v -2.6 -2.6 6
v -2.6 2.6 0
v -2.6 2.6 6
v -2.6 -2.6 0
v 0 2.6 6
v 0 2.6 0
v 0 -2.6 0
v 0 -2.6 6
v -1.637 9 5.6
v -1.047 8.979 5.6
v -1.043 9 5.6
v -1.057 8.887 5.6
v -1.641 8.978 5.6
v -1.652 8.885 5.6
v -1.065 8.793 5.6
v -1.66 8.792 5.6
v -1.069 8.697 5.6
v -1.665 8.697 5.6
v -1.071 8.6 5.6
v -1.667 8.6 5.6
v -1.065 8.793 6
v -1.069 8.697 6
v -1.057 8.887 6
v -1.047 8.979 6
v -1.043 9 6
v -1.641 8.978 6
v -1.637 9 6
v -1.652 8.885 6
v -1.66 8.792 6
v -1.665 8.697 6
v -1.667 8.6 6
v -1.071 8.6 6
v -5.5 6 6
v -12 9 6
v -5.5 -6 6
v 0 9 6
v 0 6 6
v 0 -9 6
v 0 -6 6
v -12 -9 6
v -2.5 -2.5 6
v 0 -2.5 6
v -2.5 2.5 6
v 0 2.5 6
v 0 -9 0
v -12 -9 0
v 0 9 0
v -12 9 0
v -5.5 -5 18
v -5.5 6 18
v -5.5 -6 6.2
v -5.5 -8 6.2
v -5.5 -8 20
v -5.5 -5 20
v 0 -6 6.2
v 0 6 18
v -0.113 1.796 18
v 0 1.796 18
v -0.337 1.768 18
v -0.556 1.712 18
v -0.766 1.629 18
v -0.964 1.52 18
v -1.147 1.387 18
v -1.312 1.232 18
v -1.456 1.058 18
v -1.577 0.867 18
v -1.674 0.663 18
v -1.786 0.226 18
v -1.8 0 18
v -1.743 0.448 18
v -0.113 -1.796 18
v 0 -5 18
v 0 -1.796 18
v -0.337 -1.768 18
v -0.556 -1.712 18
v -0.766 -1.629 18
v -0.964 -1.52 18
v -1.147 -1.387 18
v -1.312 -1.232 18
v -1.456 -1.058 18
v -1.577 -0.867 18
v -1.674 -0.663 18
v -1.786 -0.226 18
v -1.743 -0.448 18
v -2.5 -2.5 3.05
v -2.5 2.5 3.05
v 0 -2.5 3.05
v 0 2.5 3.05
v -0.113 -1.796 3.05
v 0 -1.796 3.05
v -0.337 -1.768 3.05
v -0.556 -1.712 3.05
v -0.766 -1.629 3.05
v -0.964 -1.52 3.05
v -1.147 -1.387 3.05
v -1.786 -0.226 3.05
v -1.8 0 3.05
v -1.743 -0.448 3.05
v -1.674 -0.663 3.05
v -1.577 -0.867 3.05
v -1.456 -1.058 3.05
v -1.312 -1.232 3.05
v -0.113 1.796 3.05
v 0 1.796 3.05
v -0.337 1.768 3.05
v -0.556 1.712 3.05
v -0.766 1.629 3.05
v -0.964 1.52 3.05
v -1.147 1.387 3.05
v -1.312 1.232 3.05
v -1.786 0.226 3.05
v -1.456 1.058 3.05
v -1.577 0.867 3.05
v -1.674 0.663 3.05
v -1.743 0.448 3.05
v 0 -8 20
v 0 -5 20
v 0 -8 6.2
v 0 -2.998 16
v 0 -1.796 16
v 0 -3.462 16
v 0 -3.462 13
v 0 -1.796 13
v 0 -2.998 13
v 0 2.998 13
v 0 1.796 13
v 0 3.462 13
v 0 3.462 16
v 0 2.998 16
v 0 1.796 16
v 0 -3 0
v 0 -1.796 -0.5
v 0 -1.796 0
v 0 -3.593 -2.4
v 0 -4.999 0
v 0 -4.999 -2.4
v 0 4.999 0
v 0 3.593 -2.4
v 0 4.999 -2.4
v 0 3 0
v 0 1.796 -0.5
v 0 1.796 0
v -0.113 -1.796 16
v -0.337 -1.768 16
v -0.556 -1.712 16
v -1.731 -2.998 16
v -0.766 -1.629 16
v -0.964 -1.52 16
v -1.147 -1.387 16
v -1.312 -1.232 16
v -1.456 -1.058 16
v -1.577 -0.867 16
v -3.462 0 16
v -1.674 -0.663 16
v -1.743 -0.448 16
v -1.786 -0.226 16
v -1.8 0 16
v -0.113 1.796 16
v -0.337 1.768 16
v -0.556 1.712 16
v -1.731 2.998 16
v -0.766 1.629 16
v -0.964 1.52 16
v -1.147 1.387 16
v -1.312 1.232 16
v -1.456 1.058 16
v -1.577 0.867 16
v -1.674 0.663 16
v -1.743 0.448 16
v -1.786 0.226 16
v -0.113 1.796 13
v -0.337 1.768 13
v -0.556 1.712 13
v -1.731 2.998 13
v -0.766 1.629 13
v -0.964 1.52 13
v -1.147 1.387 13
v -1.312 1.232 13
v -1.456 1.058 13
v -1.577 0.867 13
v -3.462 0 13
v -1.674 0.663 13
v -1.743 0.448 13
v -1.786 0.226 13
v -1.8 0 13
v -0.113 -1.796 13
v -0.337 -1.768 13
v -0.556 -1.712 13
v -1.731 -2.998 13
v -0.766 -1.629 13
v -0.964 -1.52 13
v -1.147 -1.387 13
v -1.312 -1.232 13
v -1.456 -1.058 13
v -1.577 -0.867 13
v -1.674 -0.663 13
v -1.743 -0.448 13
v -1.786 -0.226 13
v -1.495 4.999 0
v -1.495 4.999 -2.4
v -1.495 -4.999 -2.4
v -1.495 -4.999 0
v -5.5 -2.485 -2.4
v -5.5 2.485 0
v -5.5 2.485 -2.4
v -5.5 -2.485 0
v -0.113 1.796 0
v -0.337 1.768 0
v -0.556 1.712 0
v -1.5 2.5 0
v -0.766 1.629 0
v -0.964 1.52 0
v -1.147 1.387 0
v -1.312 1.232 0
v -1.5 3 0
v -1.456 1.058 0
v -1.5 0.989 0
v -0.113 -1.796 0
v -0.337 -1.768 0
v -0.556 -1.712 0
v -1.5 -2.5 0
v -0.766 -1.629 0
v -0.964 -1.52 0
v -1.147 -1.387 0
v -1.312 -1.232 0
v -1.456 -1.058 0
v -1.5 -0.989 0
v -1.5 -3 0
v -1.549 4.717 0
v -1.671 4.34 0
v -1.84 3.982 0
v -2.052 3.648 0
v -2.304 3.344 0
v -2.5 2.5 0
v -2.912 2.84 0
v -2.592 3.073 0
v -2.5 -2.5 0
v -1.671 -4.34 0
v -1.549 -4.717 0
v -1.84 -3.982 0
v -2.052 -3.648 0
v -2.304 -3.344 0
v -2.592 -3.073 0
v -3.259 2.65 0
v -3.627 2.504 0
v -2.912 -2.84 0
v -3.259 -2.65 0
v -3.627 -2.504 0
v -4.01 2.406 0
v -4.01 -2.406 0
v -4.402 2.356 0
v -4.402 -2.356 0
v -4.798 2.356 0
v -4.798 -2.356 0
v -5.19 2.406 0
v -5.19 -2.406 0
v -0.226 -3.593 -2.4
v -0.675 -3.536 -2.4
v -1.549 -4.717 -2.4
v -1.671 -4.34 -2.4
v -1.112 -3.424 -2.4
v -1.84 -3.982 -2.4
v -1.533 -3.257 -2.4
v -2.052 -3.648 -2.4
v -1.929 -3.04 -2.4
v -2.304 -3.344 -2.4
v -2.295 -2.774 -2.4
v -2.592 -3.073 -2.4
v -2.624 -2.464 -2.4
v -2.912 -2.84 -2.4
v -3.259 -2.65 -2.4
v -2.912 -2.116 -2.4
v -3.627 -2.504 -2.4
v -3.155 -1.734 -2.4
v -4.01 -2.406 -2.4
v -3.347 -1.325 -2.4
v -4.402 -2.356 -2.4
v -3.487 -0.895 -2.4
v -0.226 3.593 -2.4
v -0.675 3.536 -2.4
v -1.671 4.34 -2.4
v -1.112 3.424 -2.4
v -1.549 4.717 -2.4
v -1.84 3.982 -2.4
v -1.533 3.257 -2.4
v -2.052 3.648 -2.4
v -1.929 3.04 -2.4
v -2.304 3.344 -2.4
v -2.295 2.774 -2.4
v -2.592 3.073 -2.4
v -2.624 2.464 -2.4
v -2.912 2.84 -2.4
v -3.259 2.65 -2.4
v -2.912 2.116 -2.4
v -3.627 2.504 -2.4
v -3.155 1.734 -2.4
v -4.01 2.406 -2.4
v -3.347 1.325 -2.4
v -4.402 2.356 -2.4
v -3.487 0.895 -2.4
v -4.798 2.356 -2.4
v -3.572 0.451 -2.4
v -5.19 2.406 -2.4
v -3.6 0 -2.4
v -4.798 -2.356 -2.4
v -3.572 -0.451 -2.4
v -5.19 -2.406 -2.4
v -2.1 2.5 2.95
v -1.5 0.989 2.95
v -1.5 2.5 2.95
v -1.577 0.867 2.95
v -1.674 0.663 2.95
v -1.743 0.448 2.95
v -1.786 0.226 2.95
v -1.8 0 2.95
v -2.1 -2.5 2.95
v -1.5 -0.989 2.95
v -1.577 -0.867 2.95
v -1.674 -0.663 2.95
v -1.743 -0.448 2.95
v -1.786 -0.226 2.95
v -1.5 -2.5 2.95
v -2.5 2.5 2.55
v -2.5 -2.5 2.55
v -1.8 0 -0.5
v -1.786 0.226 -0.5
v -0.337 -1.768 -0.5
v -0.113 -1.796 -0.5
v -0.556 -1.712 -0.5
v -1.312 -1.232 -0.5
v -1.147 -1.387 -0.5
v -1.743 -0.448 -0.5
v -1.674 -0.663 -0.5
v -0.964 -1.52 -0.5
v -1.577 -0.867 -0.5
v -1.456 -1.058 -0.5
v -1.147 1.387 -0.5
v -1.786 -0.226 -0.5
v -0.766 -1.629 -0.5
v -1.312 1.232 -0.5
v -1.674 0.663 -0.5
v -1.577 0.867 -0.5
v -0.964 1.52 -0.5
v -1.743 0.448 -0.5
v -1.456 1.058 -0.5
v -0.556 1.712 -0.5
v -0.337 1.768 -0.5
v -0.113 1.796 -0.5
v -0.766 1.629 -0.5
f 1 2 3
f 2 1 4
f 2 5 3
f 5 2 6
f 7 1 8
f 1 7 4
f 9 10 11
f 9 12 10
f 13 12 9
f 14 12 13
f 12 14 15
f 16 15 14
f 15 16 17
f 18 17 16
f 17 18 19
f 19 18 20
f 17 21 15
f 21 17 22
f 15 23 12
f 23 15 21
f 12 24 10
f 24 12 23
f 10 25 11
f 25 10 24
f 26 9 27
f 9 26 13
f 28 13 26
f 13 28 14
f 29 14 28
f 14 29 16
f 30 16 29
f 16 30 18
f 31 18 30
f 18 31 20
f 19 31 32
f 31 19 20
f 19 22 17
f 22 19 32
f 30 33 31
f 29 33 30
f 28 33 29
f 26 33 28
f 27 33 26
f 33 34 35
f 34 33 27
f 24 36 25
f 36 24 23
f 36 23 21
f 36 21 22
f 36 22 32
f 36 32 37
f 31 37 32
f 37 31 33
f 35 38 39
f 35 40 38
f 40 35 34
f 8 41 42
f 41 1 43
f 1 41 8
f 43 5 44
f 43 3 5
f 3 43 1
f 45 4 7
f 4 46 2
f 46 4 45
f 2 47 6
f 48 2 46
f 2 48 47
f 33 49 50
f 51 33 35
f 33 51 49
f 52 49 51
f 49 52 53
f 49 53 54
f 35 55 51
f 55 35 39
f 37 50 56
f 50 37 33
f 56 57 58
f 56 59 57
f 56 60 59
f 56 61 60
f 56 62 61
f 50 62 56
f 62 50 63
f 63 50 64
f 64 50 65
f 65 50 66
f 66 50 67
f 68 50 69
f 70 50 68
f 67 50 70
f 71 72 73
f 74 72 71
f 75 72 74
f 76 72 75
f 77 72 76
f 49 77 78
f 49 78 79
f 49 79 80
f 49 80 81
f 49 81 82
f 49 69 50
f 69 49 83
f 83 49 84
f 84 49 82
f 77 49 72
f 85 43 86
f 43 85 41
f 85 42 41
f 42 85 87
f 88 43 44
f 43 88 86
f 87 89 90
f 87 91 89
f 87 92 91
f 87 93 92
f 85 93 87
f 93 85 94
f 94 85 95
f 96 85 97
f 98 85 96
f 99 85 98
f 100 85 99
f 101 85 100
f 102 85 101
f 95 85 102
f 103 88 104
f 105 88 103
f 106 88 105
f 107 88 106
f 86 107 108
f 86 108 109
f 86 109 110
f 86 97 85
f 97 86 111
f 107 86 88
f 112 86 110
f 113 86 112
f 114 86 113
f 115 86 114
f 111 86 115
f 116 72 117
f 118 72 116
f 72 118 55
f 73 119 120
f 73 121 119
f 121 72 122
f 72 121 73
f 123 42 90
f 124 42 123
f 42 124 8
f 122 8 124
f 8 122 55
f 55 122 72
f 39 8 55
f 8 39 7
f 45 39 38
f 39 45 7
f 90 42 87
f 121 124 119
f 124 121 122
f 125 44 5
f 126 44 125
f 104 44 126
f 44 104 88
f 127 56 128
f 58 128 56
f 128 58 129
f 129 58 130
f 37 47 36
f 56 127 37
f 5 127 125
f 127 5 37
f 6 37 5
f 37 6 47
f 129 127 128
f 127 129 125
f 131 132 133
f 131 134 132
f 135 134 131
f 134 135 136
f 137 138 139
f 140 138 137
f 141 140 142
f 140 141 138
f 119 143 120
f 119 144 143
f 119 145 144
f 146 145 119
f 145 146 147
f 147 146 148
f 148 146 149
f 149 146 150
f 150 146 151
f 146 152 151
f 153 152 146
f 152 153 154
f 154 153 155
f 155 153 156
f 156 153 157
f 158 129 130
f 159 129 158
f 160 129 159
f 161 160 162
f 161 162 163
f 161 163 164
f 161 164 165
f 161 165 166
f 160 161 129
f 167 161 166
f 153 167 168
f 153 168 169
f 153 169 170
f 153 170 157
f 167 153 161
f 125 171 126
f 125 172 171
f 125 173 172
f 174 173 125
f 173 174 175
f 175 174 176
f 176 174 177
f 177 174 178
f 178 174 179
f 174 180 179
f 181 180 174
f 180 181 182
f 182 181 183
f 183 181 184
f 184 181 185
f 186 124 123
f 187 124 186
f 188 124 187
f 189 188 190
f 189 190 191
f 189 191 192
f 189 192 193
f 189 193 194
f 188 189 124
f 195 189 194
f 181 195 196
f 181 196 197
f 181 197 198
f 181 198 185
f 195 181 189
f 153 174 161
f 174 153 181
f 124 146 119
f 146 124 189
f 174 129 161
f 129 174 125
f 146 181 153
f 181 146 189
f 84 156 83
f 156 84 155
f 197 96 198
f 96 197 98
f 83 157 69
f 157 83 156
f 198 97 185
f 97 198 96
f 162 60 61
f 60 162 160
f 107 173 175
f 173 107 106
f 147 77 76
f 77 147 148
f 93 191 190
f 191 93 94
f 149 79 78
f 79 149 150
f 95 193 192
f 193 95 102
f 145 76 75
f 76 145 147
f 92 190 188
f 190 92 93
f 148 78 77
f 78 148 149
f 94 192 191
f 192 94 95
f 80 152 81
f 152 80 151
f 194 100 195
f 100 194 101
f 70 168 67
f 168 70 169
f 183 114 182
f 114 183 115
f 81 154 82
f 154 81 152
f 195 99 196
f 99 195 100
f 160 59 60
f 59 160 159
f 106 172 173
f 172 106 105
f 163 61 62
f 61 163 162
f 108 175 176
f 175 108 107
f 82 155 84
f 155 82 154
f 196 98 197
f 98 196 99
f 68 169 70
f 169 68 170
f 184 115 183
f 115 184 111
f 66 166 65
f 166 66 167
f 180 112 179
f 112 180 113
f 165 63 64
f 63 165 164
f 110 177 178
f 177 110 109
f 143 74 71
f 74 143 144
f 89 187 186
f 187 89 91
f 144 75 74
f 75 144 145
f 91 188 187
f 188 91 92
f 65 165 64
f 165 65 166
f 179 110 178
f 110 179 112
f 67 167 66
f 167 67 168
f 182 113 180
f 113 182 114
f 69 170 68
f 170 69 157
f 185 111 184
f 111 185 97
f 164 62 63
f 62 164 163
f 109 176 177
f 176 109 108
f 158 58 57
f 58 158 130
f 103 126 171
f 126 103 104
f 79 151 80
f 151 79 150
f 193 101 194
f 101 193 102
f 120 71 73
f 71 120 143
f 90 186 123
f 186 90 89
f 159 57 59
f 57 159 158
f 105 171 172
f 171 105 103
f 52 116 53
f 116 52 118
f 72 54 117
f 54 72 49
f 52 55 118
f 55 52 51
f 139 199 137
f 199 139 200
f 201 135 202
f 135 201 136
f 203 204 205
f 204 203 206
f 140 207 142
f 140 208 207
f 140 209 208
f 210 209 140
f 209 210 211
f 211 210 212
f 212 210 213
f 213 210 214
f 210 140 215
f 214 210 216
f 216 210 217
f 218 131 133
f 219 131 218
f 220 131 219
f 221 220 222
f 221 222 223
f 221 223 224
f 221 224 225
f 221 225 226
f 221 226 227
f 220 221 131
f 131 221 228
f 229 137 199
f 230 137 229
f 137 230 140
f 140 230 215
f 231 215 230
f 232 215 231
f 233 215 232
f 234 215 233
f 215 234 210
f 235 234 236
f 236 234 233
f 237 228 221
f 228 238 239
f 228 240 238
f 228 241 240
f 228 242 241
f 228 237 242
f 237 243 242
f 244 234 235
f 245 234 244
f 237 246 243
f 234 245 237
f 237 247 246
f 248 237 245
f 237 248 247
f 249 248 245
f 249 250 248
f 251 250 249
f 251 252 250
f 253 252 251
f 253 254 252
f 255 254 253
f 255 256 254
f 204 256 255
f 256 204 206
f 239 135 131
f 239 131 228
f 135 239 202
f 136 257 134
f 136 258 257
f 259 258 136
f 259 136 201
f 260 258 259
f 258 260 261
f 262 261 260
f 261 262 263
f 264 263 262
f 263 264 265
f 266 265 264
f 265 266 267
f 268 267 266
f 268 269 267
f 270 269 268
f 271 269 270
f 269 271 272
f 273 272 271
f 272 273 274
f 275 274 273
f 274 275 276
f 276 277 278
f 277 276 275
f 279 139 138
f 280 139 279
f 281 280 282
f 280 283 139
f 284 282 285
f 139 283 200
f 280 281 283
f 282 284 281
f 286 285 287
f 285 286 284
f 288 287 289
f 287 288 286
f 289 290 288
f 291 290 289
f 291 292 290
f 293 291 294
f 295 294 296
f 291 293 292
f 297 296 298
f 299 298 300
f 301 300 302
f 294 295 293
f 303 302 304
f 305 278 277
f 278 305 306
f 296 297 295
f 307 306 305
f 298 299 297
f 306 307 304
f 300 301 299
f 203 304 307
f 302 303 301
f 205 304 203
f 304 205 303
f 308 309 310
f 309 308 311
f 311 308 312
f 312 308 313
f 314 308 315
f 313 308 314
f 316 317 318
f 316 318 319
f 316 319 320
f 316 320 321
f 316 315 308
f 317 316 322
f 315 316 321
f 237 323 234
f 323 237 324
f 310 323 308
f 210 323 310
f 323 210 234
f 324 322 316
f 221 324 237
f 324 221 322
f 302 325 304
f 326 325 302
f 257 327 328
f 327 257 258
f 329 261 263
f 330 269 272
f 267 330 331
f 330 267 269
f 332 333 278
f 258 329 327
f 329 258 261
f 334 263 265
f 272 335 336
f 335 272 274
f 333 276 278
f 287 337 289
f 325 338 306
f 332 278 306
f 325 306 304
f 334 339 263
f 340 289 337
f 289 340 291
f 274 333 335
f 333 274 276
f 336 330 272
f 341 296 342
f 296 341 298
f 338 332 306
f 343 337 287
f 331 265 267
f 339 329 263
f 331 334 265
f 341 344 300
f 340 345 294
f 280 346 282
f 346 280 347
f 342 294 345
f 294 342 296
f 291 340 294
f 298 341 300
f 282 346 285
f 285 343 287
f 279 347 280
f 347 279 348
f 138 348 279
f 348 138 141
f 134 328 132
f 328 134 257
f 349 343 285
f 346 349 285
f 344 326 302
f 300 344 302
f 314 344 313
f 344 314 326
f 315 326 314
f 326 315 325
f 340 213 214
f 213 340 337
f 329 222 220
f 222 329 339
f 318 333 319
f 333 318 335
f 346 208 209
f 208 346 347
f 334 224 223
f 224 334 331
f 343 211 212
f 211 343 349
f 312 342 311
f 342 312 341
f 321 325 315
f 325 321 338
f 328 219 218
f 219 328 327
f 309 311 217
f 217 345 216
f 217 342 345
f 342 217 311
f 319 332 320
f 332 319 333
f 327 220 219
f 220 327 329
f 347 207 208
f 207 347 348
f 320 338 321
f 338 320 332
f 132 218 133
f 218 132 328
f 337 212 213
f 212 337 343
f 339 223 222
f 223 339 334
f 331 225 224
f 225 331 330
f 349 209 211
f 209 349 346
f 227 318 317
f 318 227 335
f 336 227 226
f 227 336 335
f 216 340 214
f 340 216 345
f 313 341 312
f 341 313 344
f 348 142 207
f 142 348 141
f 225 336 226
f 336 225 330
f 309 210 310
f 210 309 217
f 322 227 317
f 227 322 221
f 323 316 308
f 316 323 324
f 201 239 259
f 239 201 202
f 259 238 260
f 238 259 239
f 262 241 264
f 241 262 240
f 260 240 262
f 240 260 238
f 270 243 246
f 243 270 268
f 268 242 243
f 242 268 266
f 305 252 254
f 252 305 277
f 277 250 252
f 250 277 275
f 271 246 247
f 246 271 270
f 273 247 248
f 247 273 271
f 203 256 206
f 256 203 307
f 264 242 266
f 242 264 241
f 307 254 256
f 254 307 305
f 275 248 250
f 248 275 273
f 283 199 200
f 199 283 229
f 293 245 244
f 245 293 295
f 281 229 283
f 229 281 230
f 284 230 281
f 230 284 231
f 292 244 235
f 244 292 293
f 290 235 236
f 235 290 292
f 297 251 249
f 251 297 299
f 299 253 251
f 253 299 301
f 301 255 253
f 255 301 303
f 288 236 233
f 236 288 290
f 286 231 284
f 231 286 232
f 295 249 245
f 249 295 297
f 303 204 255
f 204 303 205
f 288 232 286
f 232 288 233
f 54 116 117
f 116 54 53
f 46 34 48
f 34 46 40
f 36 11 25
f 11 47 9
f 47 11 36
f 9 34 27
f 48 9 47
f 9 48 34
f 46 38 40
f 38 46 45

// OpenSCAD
intersection() { union() {
color([.78,.80,.82]) { 
// Archived geometry from ../validation_v7_shorter_beams/previous_current/parts/oobb_organization_storage_drawer_unit_rectangle_100_ml_tamper_evident_systempak_209_container_2_column_2_row_ai_version_7_style_unit_2_wide_2_tall/receiver_6_0.scad
$fn = 50;

difference() {
	union() {
		translate(v = [0, 0, 0]) {
			rotate(a = [0, 0, 0]) {
				difference() {
					union() {
						translate(v = [0, 0, 0]) {
							rotate(a = [0, 0, 0]) {
								difference() {
									union() {
										hull() {
											translate(v = [-13.0, 13.0, 0]) {
												cylinder(h = 6.0, r = 2);
											}
											translate(v = [13.0, 13.0, 0]) {
												cylinder(h = 6.0, r = 2);
											}
											translate(v = [-13.0, -13.0, 0]) {
												cylinder(h = 6.0, r = 2);
											}
											translate(v = [13.0, -13.0, 0]) {
												cylinder(h = 6.0, r = 2);
											}
										}
									}
									union() {
										translate(v = [-2.6, -2.6, -0.1]) {
											cube(size = [5.2, 5.2, 6.2]);
										}
										translate(v = [0.0, 10, 5.6]) {
											linear_extrude(height = 0.5) {
												text(font = "Arial:style=Bold", halign = "center", size = 3, text = "71", valign = "center");
											}
										}
									}
								}
							}
						}
					}
					union();
				}
			}
		}
	}
	union();
}
 }
color([.13,.52,.55]) multmatrix([[0, 0, -1, 2.5], [1, 0, 0, 6.5], [0, -1, 0, 6.0], [0, 0, 0, 1]]) { 
// Archived geometry from ../validation_v7_shorter_beams/previous_current/parts/oobb_organization_storage_drawer_unit_rectangle_100_ml_tamper_evident_systempak_209_container_2_column_2_row_ai_version_7_style_unit_2_wide_2_tall/screw_beam.scad
$fn = 50;

difference() {
	union() {
		translate(v = [0, 0, 0]) {
			rotate(a = [0, 0, 0]) {
				difference() {
					union() {
						translate(v = [0, 0, 2.5]) {
							rotate(a = [0, -90, 0]) {
								difference() {
									union() {
										translate(v = [0, 0, 0]) {
											rotate(a = [0, 0, 0]) {
												difference() {
													union() {
														translate(v = [-2.5, -12.0, 0.5]) {
															cube(size = [8.0, 12.0, 12.0]);
														}
														translate(v = [-2.5, -0.05, 4.0]) {
															cube(size = [5.0, 3.0, 5.0]);
														}
													}
													union() {
														translate(v = [0, -7.0, 6.5]) {
															rotate(a = [90, 0, 0]) {
																difference() {
																	union() {
																		translate(v = [-20.0, -3.4619999999999997, 0]) {
																			cube(size = [20, 6.9239999999999995, 3]);
																		}
																		linear_extrude(height = 3) {
																			polygon(points = [[3.4619999999999997, 0.0], [1.7310000000000003, 2.9981799479017264], [-1.7309999999999992, 2.9981799479017264], [-3.4619999999999997, 4.2397272186481365e-16], [-1.7310000000000014, -2.998179947901726], [1.7309999999999977, -2.9981799479017277]]);
																		}
																	}
																	union();
																}
															}
														}
														translate(v = [0, 3.0500000000000003, 6.5]) {
															rotate(a = [90, 0, 0]) {
																cylinder(h = 22.95, r = 1.8);
															}
														}
													}
												}
											}
										}
										translate(v = [0, -212.0, 13.0]) {
											rotate(a = [180, 0, 0]) {
												difference() {
													union() {
														translate(v = [-2.5, -12.0, 0.5]) {
															cube(size = [8.0, 12.0, 12.0]);
														}
														translate(v = [-2.5, -0.05, 4.0]) {
															cube(size = [5.0, 3.0, 5.0]);
														}
													}
													union() {
														translate(v = [0, -7.0, 6.5]) {
															rotate(a = [90, 0, 0]) {
																difference() {
																	union() {
																		translate(v = [-20.0, -3.4619999999999997, 0]) {
																			cube(size = [20, 6.9239999999999995, 3]);
																		}
																		linear_extrude(height = 3) {
																			polygon(points = [[3.4619999999999997, 0.0], [1.7310000000000003, 2.9981799479017264], [-1.7309999999999992, 2.9981799479017264], [-3.4619999999999997, 4.2397272186481365e-16], [-1.7310000000000014, -2.998179947901726], [1.7309999999999977, -2.9981799479017277]]);
																		}
																	}
																	union();
																}
															}
														}
														translate(v = [0, 3.0500000000000003, 6.5]) {
															rotate(a = [90, 0, 0]) {
																cylinder(h = 22.95, r = 1.8);
															}
														}
													}
												}
											}
										}
										translate(v = [-2.5, -211.8, 11.5]) {
											cube(size = [8.0, 211.6, 3.0]);
										}
										translate(v = [-2.5, -107.5, 14.45]) {
											cube(size = [12.0, 3.0, 6.05]);
										}
									}
									union();
								}
							}
						}
					}
					union();
				}
			}
		}
	}
	union();
}
 }
color([.92,.63,.30]) translate([0,0,-2.4]) { 
// Archived geometry from ../validation_v7_shorter_beams/previous_current/parts/oobb_organization_storage_drawer_unit_rectangle_100_ml_tamper_evident_systempak_209_container_2_column_2_row_ai_version_7_style_unit_2_wide_2_tall/screw_adapter.scad
$fn = 50;

difference() {
	union() {
		translate(v = [0, 0, 0]) {
			rotate(a = [0, 0, 0]) {
				difference() {
					union() {
						translate(v = [0, 0, 0]) {
							rotate(a = [0, 0, 0]) {
								difference() {
									union() {
										translate(v = [-0.35, 0, 0]) {
											hull() {
												translate(v = [-4.4, 4.25, 0]) {
													cylinder(h = 2.4, r = 0.75);
												}
												translate(v = [4.4, 4.25, 0]) {
													cylinder(h = 2.4, r = 0.75);
												}
												translate(v = [-4.4, -4.25, 0]) {
													cylinder(h = 2.4, r = 0.75);
												}
												translate(v = [4.4, -4.25, 0]) {
													cylinder(h = 2.4, r = 0.75);
												}
											}
										}
										translate(v = [-2.5, -2.5, 2.35]) {
											cube(size = [5.0, 5.0, 3.0]);
										}
									}
									union() {
										translate(v = [0, 0, 0]) {
											rotate(a = [0, 180, 0]) {
												difference() {
													union() {
														translate(v = [0, 0, -20.0]) {
															cylinder(h = 20.0, r = 1.5);
														}
														translate(v = [0, 0, -1.9]) {
															cylinder(h = 1.9, r1 = 1.8, r2 = 3.6);
														}
														cylinder(h = 250, r = 3.6);
														translate(v = [0, 0, -20.0]) {
															cylinder(h = 20.0, r = 1.8);
														}
														translate(v = [0, 0, -20.0]) {
															cylinder(h = 20.0, r = 1.5);
														}
													}
													union();
												}
											}
										}
										translate(v = [-1.5, -3.0, 2.4]) {
											cube(size = [3.0, 6.0, 3.0500000000000003]);
										}
										translate(v = [0, 2.6, 0]) {
											rotate(a = [90, 0, 0]) {
												linear_extrude(height = 5.2) {
													polygon(points = [[-2.7, 4.75], [-1.9, 5.55], [-2.7, 5.55]]);
												}
											}
										}
										translate(v = [0, 2.6, 0]) {
											rotate(a = [90, 0, 0]) {
												linear_extrude(height = 5.2) {
													polygon(points = [[2.7, 4.75], [1.9, 5.55], [2.7, 5.55]]);
												}
											}
										}
										translate(v = [-4.6, -5.5, -0.1]) {
											cylinder(h = 2.6, r = 3.15);
										}
										translate(v = [-4.6, 5.5, -0.1]) {
											cylinder(h = 2.6, r = 3.15);
										}
										translate(v = [4.6, -5.5, -0.1]) {
											cylinder(h = 2.6, r = 3.15);
										}
										translate(v = [4.6, 5.5, -0.1]) {
											cylinder(h = 2.6, r = 3.15);
										}
									}
								}
							}
						}
					}
					union();
				}
			}
		}
	}
	union();
}
 }
} translate([-12,-9,-3]) cube([12,18,23]); }
